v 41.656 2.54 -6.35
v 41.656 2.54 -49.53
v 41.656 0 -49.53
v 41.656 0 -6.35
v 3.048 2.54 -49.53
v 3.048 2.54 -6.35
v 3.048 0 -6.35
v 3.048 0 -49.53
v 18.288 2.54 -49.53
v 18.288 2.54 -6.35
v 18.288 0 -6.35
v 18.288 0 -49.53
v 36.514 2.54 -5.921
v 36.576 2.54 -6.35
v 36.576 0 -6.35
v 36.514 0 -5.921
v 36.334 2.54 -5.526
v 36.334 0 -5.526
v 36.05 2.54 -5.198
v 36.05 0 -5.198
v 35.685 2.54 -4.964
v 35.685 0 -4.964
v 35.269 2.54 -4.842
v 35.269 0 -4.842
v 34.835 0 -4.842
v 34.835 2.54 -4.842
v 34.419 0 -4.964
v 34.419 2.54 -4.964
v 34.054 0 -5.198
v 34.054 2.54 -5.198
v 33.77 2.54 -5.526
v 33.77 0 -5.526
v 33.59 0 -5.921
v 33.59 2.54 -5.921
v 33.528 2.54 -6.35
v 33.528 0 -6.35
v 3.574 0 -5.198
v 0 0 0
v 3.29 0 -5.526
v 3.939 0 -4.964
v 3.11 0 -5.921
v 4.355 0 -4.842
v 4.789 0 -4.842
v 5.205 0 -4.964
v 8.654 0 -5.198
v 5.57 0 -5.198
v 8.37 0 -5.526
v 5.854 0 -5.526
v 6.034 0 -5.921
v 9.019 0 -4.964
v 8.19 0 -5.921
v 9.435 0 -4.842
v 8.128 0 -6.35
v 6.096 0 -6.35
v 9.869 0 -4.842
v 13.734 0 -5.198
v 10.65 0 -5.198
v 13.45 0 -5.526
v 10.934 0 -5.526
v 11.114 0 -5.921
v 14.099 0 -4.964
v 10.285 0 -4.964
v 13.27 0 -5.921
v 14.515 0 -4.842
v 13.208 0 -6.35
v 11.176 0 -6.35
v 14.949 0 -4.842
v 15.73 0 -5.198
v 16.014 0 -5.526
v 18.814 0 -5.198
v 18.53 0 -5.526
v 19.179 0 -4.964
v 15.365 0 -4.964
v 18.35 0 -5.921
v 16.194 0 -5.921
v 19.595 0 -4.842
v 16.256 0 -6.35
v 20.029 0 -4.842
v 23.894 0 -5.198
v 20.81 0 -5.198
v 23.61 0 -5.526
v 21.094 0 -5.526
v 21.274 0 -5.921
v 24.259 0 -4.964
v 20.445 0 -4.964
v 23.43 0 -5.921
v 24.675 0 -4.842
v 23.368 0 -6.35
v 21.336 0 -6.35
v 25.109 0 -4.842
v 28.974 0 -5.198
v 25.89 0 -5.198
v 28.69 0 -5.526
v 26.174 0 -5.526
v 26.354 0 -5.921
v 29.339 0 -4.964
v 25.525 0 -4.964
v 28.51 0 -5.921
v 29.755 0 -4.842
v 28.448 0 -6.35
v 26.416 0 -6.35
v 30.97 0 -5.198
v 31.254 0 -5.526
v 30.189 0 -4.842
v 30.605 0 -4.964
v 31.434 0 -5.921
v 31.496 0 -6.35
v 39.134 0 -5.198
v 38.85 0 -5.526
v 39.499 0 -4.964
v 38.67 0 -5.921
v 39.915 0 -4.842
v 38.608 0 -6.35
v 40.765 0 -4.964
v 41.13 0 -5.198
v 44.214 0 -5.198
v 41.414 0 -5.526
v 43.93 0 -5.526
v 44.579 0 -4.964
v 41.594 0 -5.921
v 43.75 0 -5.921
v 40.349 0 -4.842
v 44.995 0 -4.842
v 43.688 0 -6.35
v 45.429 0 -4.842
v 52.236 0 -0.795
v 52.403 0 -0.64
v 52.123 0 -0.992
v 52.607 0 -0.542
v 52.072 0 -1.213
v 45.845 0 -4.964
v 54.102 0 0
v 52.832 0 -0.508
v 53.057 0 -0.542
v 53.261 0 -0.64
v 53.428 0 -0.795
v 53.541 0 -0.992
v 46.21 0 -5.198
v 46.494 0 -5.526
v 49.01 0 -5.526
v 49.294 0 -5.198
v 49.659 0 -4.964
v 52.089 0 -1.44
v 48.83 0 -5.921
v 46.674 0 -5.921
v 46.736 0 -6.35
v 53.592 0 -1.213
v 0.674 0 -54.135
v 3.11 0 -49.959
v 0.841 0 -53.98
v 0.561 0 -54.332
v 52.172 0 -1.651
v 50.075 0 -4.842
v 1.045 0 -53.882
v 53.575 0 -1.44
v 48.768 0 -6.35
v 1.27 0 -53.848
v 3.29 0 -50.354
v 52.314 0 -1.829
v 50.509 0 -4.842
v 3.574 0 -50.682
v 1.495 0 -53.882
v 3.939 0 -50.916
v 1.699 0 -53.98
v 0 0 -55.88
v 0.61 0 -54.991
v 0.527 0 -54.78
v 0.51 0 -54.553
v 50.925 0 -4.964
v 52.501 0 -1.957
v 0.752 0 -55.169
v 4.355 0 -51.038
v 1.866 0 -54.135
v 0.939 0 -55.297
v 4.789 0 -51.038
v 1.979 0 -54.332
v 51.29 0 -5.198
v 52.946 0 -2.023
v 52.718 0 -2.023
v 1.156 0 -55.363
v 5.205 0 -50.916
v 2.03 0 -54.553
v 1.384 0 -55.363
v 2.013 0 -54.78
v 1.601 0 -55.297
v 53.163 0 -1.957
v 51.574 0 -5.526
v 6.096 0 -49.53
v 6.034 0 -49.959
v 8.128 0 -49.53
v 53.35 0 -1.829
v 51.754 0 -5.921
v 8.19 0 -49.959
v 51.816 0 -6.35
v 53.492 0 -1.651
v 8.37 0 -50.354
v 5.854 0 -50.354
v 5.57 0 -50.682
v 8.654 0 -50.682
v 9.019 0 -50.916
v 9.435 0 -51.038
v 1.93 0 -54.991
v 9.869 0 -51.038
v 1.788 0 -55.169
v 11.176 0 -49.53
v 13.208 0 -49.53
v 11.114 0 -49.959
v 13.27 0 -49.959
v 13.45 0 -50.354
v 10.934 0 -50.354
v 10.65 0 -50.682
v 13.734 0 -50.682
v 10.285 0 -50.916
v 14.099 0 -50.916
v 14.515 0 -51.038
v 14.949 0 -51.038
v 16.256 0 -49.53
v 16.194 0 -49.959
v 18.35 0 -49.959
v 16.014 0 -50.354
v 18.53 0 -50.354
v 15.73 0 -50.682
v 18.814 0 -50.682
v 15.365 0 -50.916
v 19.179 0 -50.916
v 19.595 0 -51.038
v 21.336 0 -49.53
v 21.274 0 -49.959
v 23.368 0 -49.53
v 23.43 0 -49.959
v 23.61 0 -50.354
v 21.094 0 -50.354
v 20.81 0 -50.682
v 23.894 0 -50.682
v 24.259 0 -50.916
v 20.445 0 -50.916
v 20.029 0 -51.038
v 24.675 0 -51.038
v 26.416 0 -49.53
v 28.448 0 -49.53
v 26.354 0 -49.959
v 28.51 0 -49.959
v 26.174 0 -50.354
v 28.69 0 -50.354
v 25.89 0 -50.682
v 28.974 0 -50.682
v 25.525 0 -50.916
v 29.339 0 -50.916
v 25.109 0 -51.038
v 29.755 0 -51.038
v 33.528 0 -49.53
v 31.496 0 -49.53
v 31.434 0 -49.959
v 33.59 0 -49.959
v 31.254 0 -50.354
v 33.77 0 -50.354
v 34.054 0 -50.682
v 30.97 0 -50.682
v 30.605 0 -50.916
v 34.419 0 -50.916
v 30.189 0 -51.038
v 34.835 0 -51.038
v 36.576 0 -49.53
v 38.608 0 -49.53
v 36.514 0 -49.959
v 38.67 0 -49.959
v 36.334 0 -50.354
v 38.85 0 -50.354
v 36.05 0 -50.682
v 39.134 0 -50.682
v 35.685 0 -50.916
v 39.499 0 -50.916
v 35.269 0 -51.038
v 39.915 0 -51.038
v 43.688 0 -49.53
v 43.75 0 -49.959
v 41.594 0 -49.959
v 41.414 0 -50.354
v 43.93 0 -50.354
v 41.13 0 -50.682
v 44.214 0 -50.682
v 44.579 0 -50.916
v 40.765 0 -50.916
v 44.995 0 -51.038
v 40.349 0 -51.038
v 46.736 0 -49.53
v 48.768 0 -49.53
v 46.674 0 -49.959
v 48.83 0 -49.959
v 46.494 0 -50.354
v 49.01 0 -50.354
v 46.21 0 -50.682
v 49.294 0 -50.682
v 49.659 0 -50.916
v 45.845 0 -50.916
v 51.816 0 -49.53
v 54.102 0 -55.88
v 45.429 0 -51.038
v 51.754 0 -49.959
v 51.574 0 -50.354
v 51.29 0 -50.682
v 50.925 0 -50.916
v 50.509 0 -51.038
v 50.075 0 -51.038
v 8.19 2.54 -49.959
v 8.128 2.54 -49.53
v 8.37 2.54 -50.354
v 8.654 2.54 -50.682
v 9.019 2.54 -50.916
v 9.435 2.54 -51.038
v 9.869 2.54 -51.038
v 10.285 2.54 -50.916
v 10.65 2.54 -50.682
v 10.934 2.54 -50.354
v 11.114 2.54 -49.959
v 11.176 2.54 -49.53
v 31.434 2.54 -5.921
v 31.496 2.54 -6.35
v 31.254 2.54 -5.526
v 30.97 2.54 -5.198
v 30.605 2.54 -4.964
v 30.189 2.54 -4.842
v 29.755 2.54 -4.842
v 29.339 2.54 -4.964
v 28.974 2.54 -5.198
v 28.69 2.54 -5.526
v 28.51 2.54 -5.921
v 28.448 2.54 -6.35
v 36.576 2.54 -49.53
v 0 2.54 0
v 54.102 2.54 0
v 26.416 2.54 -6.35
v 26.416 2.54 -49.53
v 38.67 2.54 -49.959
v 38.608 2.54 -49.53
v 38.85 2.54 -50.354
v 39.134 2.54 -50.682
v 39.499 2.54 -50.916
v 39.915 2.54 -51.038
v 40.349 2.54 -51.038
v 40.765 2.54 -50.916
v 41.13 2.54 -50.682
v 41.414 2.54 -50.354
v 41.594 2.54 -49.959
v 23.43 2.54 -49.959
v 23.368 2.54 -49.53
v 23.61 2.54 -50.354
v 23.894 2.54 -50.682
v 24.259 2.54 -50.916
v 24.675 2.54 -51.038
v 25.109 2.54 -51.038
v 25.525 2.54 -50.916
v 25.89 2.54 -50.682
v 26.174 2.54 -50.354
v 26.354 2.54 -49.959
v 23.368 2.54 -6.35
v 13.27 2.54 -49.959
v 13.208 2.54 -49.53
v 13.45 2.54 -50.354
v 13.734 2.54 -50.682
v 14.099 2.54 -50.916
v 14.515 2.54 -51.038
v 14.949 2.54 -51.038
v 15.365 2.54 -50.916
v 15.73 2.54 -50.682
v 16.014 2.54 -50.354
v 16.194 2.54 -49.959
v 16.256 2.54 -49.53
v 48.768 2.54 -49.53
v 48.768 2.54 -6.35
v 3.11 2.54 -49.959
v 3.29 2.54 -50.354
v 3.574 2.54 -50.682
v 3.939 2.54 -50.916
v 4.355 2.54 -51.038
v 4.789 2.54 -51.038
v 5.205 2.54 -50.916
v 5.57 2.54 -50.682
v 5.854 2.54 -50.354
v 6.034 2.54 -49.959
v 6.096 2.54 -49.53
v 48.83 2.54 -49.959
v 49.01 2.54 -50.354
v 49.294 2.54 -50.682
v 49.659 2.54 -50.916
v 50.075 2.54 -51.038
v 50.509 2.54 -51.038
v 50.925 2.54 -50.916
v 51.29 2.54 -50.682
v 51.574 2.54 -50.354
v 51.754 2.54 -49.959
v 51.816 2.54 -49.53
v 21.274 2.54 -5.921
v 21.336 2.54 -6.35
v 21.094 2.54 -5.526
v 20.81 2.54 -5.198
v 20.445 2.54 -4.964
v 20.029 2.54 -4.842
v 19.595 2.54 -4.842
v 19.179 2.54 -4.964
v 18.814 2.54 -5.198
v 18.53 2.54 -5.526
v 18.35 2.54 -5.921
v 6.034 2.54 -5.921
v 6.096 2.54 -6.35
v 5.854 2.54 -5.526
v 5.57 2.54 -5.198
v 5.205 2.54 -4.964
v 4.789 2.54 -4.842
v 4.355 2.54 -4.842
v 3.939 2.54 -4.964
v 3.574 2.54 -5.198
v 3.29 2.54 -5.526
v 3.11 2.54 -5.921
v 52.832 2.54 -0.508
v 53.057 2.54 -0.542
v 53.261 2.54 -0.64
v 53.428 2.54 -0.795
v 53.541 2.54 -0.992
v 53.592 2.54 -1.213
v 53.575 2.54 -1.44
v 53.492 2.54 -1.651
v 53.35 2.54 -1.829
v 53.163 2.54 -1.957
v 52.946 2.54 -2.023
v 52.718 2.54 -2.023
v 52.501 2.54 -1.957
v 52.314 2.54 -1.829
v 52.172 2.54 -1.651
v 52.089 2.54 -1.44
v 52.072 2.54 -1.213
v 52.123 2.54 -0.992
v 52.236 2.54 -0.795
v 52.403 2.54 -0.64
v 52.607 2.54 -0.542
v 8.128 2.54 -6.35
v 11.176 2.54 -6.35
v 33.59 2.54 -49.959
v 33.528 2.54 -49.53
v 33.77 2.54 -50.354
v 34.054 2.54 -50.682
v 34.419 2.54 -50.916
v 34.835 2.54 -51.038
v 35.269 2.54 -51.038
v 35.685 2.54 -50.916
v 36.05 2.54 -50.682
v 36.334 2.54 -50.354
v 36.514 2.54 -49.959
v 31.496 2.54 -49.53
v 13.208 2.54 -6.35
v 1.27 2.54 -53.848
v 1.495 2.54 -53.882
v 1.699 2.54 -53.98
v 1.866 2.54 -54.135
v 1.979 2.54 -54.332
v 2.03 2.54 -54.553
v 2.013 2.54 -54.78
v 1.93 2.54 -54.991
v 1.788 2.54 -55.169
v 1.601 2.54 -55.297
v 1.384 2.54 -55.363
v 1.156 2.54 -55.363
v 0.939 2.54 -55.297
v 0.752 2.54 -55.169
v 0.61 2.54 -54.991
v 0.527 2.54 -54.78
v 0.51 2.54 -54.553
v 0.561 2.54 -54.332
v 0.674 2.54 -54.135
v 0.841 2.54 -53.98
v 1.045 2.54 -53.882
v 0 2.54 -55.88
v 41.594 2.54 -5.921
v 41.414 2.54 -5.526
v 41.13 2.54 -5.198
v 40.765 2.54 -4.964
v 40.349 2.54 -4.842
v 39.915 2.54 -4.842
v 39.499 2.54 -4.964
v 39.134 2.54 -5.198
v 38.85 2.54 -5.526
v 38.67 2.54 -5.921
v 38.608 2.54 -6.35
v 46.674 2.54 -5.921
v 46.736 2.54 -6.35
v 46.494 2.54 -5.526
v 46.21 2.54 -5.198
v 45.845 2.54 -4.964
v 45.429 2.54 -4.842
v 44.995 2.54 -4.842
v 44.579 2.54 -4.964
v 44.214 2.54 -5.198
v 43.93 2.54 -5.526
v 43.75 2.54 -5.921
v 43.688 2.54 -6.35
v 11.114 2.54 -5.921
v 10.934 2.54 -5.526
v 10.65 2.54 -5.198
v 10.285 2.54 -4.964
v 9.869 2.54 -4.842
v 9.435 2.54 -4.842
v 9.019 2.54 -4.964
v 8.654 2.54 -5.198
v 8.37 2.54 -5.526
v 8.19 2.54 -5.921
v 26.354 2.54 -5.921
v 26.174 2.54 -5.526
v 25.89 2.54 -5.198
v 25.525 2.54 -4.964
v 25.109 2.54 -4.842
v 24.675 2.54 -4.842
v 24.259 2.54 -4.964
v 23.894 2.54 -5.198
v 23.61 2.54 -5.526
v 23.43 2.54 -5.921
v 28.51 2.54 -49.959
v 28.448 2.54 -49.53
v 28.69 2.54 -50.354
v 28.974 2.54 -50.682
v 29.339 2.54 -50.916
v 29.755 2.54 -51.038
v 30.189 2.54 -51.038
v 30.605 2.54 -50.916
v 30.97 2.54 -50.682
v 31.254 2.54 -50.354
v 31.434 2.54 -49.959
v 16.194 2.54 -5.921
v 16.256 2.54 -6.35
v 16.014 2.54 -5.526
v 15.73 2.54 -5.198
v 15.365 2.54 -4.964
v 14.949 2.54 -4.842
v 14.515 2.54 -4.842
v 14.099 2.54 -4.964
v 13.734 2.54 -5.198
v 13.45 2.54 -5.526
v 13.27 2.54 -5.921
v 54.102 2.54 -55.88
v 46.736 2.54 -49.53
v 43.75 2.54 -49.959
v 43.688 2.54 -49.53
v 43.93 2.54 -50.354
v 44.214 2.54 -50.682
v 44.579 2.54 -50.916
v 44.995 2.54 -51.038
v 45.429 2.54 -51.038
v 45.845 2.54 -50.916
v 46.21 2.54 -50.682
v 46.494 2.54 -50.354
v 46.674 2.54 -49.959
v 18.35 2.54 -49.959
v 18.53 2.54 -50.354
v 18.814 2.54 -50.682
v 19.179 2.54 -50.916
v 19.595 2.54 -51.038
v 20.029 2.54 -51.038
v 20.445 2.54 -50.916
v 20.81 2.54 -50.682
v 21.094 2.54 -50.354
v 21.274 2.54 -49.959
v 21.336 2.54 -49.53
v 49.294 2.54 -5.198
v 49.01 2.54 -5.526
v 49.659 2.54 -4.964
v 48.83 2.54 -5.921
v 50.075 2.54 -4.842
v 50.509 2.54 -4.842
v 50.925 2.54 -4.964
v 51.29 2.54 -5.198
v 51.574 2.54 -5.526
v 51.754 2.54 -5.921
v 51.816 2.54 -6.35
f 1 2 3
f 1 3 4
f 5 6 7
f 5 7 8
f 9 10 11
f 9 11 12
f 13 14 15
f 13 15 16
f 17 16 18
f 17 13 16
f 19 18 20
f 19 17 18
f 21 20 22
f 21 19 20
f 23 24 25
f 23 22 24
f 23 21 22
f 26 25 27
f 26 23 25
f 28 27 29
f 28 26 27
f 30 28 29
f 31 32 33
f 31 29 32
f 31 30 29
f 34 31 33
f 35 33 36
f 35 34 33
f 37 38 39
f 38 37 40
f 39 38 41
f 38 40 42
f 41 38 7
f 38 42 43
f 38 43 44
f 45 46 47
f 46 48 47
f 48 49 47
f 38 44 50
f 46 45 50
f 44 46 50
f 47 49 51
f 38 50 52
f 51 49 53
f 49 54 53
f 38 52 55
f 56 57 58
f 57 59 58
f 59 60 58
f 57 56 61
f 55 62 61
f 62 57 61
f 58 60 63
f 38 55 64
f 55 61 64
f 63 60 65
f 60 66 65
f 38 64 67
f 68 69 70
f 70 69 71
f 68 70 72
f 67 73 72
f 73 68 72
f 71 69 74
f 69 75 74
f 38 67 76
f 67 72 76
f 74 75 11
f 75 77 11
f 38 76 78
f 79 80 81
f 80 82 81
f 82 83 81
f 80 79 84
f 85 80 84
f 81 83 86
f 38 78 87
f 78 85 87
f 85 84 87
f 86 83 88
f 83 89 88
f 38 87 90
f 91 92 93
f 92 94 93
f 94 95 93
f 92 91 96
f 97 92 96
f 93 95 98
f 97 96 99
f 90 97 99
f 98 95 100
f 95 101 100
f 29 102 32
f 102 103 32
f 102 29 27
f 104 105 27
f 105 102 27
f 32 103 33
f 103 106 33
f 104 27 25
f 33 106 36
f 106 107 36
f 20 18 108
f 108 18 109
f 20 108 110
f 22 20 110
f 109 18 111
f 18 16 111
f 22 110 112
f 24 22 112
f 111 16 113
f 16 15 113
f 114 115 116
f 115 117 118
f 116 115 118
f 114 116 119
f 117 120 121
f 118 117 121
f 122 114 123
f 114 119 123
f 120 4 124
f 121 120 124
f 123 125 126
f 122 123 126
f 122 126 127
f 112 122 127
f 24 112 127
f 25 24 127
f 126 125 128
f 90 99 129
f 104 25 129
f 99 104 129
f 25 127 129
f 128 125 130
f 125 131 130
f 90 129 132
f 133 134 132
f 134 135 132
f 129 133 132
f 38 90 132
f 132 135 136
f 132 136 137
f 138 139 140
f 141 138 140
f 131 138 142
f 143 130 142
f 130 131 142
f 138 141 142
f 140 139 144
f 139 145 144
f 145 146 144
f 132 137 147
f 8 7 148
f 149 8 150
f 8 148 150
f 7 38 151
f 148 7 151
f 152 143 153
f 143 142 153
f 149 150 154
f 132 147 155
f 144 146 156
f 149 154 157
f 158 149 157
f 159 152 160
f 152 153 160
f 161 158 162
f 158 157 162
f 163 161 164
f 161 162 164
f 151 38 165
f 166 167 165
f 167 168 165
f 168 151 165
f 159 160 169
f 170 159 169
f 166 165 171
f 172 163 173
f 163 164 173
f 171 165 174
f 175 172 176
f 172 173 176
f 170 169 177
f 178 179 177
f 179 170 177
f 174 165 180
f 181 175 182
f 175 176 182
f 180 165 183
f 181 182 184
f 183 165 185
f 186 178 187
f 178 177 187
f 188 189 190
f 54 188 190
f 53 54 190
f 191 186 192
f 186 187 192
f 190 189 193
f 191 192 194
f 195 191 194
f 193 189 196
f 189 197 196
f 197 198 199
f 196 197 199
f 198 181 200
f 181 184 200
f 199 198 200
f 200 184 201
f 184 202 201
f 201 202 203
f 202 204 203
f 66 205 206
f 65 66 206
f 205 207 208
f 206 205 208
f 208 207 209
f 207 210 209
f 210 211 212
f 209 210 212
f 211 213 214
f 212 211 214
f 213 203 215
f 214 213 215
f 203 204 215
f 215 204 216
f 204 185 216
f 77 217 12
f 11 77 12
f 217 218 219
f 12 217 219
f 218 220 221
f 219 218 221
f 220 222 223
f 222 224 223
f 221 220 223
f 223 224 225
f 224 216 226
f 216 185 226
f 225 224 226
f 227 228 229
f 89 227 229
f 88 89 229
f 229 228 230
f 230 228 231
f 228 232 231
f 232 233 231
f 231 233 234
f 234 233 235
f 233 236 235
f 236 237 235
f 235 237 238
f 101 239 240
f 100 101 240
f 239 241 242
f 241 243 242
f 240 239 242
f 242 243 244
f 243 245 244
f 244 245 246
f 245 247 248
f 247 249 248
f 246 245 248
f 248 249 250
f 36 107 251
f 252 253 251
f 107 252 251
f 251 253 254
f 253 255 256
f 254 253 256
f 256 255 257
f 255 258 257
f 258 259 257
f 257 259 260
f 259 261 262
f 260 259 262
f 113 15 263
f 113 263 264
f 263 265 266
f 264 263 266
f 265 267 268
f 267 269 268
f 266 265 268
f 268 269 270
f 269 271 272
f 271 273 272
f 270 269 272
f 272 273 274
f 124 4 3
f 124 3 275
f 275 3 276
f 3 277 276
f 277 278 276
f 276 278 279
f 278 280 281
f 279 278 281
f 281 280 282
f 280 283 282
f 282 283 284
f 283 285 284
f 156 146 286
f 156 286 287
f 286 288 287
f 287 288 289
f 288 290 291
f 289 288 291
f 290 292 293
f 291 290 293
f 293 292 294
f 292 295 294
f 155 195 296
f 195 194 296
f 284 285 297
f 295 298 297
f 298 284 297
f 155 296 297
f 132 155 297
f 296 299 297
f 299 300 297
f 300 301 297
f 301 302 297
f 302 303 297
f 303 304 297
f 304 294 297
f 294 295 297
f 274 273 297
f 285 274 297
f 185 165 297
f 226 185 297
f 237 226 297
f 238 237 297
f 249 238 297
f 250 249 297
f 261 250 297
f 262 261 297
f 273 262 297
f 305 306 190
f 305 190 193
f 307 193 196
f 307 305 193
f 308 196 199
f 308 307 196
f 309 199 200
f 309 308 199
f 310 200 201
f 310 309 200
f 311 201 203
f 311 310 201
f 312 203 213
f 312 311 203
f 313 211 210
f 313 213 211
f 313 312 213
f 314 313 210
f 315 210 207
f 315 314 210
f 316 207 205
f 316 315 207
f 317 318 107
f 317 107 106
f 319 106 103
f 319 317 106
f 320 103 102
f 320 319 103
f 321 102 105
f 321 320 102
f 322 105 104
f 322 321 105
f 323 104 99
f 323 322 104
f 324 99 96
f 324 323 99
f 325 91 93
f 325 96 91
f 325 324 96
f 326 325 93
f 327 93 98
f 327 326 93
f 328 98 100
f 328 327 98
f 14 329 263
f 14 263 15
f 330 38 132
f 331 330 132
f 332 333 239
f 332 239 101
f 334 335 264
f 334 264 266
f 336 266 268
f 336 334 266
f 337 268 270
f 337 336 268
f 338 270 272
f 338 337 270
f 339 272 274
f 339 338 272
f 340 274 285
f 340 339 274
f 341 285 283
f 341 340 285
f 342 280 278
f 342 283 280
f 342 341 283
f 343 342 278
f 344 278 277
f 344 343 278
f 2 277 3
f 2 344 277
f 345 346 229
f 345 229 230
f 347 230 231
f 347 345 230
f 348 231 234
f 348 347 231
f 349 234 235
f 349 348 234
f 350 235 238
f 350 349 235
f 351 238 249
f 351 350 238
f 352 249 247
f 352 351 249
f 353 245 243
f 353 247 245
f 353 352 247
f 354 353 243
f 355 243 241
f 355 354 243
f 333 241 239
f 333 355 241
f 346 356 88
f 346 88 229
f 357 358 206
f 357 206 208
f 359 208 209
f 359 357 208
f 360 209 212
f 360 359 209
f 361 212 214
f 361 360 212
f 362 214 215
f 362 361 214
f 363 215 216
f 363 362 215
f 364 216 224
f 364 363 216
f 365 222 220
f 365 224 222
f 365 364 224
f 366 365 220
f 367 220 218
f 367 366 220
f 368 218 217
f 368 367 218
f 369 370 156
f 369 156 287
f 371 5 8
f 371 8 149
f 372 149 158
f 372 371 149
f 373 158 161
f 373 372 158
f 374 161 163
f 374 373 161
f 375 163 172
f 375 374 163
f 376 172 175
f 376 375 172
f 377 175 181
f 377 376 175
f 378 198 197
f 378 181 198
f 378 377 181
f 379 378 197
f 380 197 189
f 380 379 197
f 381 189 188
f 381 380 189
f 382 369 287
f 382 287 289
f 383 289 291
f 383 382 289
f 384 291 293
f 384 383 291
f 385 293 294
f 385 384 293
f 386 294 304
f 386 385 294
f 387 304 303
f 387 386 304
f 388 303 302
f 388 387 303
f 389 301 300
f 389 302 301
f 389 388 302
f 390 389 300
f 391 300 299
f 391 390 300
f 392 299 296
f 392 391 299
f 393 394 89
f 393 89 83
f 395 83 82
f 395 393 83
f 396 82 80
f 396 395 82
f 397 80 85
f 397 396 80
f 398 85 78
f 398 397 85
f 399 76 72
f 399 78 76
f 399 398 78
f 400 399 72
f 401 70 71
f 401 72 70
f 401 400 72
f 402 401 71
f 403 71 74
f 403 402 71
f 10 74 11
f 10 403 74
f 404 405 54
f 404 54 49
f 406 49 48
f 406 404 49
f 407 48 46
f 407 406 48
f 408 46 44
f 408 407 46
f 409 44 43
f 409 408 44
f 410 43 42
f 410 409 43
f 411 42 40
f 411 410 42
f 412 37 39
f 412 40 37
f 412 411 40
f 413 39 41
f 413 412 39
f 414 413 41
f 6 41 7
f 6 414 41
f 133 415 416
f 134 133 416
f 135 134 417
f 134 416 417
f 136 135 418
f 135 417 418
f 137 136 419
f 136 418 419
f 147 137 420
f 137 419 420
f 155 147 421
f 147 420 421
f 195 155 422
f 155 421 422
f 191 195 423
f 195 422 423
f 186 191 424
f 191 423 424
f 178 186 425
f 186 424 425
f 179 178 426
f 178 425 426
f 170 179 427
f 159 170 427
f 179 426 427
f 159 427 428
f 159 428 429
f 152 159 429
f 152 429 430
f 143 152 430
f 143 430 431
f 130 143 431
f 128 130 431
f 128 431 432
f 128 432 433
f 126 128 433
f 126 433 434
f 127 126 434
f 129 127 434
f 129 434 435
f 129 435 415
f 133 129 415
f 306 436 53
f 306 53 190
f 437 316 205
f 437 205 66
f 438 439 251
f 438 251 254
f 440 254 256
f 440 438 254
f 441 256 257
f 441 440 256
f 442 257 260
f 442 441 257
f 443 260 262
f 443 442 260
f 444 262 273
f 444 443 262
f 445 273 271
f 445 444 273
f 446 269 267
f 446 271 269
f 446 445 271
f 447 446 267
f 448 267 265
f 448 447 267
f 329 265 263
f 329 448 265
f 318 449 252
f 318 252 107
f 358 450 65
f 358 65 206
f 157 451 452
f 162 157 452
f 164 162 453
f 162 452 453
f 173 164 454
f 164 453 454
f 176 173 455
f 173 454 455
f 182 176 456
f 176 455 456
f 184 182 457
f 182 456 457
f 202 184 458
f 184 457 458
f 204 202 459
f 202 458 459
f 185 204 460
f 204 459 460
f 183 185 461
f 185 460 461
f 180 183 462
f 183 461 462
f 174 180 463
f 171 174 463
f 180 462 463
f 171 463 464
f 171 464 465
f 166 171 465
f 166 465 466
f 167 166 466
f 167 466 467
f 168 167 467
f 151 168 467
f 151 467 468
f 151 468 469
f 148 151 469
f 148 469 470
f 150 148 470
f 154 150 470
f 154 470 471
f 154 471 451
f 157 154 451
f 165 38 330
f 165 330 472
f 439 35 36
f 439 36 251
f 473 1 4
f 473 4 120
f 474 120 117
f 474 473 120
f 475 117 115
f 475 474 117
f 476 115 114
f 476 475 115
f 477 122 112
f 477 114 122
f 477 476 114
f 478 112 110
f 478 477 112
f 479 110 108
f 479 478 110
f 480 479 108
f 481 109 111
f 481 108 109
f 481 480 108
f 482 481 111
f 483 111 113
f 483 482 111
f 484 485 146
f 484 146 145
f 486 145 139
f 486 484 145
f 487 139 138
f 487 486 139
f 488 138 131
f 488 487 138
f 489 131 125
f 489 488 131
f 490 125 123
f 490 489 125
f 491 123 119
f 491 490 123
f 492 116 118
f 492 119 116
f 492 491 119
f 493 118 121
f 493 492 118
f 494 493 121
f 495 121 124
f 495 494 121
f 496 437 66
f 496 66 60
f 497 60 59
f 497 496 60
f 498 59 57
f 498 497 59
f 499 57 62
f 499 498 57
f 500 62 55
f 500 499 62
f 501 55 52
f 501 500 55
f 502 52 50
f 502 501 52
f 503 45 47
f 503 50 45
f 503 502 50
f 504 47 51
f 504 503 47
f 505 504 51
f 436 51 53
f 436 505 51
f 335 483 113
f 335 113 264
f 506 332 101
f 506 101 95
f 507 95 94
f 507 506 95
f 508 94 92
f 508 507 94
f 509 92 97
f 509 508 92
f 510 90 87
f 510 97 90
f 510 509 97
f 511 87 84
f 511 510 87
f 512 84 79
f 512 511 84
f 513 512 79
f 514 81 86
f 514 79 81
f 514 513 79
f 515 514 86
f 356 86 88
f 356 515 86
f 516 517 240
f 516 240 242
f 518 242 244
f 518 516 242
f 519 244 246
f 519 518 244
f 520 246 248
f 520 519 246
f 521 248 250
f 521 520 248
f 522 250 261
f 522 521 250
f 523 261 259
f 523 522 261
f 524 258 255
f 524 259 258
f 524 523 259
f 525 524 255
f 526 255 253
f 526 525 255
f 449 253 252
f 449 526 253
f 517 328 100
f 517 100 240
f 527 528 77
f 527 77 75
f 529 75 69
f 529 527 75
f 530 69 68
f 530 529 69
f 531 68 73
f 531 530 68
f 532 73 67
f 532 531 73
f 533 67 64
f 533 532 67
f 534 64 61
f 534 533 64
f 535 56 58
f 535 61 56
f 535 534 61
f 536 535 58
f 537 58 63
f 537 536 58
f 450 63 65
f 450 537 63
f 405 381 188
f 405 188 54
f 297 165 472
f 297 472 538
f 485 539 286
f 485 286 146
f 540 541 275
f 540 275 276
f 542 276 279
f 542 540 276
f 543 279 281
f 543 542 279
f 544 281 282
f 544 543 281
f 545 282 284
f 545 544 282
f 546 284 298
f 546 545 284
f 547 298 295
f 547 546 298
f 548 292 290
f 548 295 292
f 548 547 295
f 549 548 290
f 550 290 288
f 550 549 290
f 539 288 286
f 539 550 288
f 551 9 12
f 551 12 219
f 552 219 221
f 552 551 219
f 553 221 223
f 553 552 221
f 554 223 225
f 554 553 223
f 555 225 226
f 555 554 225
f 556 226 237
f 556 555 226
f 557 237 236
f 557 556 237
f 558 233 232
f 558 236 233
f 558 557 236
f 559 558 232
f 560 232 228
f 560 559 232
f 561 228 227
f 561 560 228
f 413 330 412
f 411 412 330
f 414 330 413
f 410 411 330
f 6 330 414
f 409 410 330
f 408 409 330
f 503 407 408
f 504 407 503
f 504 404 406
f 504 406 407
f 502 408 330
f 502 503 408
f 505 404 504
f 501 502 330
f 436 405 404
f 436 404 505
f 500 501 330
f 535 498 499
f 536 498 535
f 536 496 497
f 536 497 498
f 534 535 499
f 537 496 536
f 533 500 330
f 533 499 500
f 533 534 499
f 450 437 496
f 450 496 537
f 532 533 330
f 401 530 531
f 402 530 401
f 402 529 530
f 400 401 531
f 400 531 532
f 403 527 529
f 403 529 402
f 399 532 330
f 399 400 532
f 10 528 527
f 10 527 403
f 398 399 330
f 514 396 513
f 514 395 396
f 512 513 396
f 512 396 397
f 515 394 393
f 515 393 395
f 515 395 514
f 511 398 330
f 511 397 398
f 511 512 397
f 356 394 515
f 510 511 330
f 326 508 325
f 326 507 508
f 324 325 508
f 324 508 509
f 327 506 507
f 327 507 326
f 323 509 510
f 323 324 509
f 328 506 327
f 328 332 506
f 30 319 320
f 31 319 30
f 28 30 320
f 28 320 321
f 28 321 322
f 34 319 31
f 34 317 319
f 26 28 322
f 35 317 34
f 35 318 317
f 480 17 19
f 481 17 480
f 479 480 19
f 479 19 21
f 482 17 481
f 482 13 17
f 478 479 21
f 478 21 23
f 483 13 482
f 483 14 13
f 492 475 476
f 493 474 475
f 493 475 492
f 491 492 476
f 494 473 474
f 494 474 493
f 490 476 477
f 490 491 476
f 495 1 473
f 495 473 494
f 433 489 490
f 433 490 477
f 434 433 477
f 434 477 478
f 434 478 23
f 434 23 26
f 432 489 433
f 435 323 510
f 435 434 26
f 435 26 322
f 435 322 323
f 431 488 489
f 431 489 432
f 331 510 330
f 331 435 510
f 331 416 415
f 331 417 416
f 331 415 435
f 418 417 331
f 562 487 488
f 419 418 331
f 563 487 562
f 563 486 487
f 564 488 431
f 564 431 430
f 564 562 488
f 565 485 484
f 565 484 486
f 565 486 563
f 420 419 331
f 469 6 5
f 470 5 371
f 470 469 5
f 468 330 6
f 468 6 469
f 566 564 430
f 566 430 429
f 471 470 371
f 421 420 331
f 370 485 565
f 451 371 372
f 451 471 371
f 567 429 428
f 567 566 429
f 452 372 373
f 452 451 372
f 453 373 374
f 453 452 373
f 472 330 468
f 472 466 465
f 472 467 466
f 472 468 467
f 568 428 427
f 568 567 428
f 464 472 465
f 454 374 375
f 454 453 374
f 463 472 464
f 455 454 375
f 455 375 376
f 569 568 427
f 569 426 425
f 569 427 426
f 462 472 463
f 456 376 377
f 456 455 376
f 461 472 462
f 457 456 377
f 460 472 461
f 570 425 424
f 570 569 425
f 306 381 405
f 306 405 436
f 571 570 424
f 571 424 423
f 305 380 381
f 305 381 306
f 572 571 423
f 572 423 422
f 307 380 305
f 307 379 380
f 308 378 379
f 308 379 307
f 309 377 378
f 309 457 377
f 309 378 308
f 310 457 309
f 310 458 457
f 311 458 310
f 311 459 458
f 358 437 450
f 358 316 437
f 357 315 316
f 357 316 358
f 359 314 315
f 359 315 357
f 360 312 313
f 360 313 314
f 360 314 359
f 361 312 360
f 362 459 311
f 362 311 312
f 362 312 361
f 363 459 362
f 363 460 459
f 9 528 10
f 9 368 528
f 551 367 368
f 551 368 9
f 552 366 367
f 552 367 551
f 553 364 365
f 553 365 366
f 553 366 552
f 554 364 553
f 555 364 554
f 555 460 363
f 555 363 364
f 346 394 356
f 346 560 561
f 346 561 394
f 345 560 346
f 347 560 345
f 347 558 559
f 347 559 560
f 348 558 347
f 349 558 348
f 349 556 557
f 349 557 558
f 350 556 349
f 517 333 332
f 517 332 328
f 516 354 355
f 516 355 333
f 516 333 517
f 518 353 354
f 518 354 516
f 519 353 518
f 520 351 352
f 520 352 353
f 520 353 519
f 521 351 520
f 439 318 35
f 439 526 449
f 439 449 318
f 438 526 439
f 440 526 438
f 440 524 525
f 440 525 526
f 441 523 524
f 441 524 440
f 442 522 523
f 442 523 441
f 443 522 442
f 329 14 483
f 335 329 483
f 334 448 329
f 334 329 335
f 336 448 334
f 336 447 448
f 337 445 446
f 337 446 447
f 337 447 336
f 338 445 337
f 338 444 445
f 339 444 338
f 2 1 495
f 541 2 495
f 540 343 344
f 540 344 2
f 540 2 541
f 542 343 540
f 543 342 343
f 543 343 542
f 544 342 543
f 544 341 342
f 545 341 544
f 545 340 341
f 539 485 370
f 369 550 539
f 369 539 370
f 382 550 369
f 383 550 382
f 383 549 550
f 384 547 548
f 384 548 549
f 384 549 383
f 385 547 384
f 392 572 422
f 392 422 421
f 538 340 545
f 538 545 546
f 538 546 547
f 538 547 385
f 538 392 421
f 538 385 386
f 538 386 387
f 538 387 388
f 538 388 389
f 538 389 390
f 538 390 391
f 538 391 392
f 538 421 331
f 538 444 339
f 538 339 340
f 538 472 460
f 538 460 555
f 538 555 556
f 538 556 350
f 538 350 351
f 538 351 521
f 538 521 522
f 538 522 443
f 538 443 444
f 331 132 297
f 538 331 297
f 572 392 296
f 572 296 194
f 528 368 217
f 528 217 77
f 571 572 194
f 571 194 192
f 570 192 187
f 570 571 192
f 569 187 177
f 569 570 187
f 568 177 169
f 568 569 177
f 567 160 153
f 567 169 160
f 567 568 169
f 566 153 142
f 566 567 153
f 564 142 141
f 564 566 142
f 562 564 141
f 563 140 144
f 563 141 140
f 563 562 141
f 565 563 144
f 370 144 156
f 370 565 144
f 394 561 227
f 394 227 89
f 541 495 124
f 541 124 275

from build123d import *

# Parameters (mm, degrees)
SKETCH1_W           = 54.102
SKETCH1_H           = 55.88
BOSS_EXTRUDE1_DEPTH = 2.54
SKETCH2_R           = 0.762
CUT_EXTRUDE1_DEPTH  = 49.276


with BuildPart() as part:
    # Sketch1 → Boss-Extrude1 (new body)
    with BuildSketch(Plane(origin=(0, 0, 0), x_dir=(1, 0, 0), z_dir=(0, 1, 0))):
        with Locations((27.051, 27.94)):
            Rectangle(SKETCH1_W, SKETCH1_H)
    extrude(amount=BOSS_EXTRUDE1_DEPTH)

    # Sketch2 → Cut-Extrude1 (cut)
    with BuildSketch(Plane(origin=(0, 2.54, 0), x_dir=(1, 0, 0), z_dir=(0, 1, 0))):
        with Locations(Location((1.27, 54.61, 0), (0, 0, 270))):
            Circle(SKETCH2_R)
        with Locations(Location((52.832, 1.27, 0), (0, 0, 270))):
            Circle(SKETCH2_R)
        with BuildLine():
            Line((6.096, 49.53), (6.096, 6.35))
            ThreePointArc((6.096, 6.35), (4.572, 4.826), (3.048, 6.35))
            Line((3.048, 6.35), (3.048, 49.53))
            ThreePointArc((3.048, 49.53), (4.572, 51.054), (6.096, 49.53))
        make_face()
        with BuildLine():
            Line((11.176, 49.53), (11.176, 6.35))
            ThreePointArc((11.176, 6.35), (9.652, 4.826), (8.128, 6.35))
            Line((8.128, 6.35), (8.128, 49.53))
            ThreePointArc((8.128, 49.53), (9.652, 51.054), (11.176, 49.53))
        make_face()
        with BuildLine():
            Line((16.256, 49.53), (16.256, 6.35))
            ThreePointArc((16.256, 6.35), (14.732, 4.826), (13.208, 6.35))
            Line((13.208, 6.35), (13.208, 49.53))
            ThreePointArc((13.208, 49.53), (14.732, 51.054), (16.256, 49.53))
        make_face()
        with BuildLine():
            Line((21.336, 49.53), (21.336, 6.35))
            ThreePointArc((21.336, 6.35), (19.812, 4.826), (18.288, 6.35))
            Line((18.288, 6.35), (18.288, 49.53))
            ThreePointArc((18.288, 49.53), (19.812, 51.054), (21.336, 49.53))
        make_face()
        with BuildLine():
            Line((26.416, 49.53), (26.416, 6.35))
            ThreePointArc((26.416, 6.35), (24.892, 4.826), (23.368, 6.35))
            Line((23.368, 6.35), (23.368, 49.53))
            ThreePointArc((23.368, 49.53), (24.892, 51.054), (26.416, 49.53))
        make_face()
        with BuildLine():
            Line((31.496, 49.53), (31.496, 6.35))
            ThreePointArc((31.496, 6.35), (29.972, 4.826), (28.448, 6.35))
            Line((28.448, 6.35), (28.448, 49.53))
            ThreePointArc((28.448, 49.53), (29.972, 51.054), (31.496, 49.53))
        make_face()
        with BuildLine():
            Line((36.576, 49.53), (36.576, 6.35))
            ThreePointArc((36.576, 6.35), (35.052, 4.826), (33.528, 6.35))
            Line((33.528, 6.35), (33.528, 49.53))
            ThreePointArc((33.528, 49.53), (35.052, 51.054), (36.576, 49.53))
        make_face()
        with BuildLine():
            Line((41.656, 49.53), (41.656, 6.35))
            ThreePointArc((41.656, 6.35), (40.132, 4.826), (38.608, 6.35))
            Line((38.608, 6.35), (38.608, 49.53))
            ThreePointArc((38.608, 49.53), (40.132, 51.054), (41.656, 49.53))
        make_face()
        with BuildLine():
            Line((46.736, 49.53), (46.736, 6.35))
            ThreePointArc((46.736, 6.35), (45.212, 4.826), (43.688, 6.35))
            Line((43.688, 6.35), (43.688, 49.53))
            ThreePointArc((43.688, 49.53), (45.212, 51.054), (46.736, 49.53))
        make_face()
        with BuildLine():
            Line((51.816, 49.53), (51.816, 6.35))
            ThreePointArc((51.816, 6.35), (50.292, 4.826), (48.768, 6.35))
            Line((48.768, 6.35), (48.768, 49.53))
            ThreePointArc((48.768, 49.53), (50.292, 51.054), (51.816, 49.53))
        make_face()
    extrude(amount=-CUT_EXTRUDE1_DEPTH, mode=Mode.SUBTRACT)


solid = part.part
